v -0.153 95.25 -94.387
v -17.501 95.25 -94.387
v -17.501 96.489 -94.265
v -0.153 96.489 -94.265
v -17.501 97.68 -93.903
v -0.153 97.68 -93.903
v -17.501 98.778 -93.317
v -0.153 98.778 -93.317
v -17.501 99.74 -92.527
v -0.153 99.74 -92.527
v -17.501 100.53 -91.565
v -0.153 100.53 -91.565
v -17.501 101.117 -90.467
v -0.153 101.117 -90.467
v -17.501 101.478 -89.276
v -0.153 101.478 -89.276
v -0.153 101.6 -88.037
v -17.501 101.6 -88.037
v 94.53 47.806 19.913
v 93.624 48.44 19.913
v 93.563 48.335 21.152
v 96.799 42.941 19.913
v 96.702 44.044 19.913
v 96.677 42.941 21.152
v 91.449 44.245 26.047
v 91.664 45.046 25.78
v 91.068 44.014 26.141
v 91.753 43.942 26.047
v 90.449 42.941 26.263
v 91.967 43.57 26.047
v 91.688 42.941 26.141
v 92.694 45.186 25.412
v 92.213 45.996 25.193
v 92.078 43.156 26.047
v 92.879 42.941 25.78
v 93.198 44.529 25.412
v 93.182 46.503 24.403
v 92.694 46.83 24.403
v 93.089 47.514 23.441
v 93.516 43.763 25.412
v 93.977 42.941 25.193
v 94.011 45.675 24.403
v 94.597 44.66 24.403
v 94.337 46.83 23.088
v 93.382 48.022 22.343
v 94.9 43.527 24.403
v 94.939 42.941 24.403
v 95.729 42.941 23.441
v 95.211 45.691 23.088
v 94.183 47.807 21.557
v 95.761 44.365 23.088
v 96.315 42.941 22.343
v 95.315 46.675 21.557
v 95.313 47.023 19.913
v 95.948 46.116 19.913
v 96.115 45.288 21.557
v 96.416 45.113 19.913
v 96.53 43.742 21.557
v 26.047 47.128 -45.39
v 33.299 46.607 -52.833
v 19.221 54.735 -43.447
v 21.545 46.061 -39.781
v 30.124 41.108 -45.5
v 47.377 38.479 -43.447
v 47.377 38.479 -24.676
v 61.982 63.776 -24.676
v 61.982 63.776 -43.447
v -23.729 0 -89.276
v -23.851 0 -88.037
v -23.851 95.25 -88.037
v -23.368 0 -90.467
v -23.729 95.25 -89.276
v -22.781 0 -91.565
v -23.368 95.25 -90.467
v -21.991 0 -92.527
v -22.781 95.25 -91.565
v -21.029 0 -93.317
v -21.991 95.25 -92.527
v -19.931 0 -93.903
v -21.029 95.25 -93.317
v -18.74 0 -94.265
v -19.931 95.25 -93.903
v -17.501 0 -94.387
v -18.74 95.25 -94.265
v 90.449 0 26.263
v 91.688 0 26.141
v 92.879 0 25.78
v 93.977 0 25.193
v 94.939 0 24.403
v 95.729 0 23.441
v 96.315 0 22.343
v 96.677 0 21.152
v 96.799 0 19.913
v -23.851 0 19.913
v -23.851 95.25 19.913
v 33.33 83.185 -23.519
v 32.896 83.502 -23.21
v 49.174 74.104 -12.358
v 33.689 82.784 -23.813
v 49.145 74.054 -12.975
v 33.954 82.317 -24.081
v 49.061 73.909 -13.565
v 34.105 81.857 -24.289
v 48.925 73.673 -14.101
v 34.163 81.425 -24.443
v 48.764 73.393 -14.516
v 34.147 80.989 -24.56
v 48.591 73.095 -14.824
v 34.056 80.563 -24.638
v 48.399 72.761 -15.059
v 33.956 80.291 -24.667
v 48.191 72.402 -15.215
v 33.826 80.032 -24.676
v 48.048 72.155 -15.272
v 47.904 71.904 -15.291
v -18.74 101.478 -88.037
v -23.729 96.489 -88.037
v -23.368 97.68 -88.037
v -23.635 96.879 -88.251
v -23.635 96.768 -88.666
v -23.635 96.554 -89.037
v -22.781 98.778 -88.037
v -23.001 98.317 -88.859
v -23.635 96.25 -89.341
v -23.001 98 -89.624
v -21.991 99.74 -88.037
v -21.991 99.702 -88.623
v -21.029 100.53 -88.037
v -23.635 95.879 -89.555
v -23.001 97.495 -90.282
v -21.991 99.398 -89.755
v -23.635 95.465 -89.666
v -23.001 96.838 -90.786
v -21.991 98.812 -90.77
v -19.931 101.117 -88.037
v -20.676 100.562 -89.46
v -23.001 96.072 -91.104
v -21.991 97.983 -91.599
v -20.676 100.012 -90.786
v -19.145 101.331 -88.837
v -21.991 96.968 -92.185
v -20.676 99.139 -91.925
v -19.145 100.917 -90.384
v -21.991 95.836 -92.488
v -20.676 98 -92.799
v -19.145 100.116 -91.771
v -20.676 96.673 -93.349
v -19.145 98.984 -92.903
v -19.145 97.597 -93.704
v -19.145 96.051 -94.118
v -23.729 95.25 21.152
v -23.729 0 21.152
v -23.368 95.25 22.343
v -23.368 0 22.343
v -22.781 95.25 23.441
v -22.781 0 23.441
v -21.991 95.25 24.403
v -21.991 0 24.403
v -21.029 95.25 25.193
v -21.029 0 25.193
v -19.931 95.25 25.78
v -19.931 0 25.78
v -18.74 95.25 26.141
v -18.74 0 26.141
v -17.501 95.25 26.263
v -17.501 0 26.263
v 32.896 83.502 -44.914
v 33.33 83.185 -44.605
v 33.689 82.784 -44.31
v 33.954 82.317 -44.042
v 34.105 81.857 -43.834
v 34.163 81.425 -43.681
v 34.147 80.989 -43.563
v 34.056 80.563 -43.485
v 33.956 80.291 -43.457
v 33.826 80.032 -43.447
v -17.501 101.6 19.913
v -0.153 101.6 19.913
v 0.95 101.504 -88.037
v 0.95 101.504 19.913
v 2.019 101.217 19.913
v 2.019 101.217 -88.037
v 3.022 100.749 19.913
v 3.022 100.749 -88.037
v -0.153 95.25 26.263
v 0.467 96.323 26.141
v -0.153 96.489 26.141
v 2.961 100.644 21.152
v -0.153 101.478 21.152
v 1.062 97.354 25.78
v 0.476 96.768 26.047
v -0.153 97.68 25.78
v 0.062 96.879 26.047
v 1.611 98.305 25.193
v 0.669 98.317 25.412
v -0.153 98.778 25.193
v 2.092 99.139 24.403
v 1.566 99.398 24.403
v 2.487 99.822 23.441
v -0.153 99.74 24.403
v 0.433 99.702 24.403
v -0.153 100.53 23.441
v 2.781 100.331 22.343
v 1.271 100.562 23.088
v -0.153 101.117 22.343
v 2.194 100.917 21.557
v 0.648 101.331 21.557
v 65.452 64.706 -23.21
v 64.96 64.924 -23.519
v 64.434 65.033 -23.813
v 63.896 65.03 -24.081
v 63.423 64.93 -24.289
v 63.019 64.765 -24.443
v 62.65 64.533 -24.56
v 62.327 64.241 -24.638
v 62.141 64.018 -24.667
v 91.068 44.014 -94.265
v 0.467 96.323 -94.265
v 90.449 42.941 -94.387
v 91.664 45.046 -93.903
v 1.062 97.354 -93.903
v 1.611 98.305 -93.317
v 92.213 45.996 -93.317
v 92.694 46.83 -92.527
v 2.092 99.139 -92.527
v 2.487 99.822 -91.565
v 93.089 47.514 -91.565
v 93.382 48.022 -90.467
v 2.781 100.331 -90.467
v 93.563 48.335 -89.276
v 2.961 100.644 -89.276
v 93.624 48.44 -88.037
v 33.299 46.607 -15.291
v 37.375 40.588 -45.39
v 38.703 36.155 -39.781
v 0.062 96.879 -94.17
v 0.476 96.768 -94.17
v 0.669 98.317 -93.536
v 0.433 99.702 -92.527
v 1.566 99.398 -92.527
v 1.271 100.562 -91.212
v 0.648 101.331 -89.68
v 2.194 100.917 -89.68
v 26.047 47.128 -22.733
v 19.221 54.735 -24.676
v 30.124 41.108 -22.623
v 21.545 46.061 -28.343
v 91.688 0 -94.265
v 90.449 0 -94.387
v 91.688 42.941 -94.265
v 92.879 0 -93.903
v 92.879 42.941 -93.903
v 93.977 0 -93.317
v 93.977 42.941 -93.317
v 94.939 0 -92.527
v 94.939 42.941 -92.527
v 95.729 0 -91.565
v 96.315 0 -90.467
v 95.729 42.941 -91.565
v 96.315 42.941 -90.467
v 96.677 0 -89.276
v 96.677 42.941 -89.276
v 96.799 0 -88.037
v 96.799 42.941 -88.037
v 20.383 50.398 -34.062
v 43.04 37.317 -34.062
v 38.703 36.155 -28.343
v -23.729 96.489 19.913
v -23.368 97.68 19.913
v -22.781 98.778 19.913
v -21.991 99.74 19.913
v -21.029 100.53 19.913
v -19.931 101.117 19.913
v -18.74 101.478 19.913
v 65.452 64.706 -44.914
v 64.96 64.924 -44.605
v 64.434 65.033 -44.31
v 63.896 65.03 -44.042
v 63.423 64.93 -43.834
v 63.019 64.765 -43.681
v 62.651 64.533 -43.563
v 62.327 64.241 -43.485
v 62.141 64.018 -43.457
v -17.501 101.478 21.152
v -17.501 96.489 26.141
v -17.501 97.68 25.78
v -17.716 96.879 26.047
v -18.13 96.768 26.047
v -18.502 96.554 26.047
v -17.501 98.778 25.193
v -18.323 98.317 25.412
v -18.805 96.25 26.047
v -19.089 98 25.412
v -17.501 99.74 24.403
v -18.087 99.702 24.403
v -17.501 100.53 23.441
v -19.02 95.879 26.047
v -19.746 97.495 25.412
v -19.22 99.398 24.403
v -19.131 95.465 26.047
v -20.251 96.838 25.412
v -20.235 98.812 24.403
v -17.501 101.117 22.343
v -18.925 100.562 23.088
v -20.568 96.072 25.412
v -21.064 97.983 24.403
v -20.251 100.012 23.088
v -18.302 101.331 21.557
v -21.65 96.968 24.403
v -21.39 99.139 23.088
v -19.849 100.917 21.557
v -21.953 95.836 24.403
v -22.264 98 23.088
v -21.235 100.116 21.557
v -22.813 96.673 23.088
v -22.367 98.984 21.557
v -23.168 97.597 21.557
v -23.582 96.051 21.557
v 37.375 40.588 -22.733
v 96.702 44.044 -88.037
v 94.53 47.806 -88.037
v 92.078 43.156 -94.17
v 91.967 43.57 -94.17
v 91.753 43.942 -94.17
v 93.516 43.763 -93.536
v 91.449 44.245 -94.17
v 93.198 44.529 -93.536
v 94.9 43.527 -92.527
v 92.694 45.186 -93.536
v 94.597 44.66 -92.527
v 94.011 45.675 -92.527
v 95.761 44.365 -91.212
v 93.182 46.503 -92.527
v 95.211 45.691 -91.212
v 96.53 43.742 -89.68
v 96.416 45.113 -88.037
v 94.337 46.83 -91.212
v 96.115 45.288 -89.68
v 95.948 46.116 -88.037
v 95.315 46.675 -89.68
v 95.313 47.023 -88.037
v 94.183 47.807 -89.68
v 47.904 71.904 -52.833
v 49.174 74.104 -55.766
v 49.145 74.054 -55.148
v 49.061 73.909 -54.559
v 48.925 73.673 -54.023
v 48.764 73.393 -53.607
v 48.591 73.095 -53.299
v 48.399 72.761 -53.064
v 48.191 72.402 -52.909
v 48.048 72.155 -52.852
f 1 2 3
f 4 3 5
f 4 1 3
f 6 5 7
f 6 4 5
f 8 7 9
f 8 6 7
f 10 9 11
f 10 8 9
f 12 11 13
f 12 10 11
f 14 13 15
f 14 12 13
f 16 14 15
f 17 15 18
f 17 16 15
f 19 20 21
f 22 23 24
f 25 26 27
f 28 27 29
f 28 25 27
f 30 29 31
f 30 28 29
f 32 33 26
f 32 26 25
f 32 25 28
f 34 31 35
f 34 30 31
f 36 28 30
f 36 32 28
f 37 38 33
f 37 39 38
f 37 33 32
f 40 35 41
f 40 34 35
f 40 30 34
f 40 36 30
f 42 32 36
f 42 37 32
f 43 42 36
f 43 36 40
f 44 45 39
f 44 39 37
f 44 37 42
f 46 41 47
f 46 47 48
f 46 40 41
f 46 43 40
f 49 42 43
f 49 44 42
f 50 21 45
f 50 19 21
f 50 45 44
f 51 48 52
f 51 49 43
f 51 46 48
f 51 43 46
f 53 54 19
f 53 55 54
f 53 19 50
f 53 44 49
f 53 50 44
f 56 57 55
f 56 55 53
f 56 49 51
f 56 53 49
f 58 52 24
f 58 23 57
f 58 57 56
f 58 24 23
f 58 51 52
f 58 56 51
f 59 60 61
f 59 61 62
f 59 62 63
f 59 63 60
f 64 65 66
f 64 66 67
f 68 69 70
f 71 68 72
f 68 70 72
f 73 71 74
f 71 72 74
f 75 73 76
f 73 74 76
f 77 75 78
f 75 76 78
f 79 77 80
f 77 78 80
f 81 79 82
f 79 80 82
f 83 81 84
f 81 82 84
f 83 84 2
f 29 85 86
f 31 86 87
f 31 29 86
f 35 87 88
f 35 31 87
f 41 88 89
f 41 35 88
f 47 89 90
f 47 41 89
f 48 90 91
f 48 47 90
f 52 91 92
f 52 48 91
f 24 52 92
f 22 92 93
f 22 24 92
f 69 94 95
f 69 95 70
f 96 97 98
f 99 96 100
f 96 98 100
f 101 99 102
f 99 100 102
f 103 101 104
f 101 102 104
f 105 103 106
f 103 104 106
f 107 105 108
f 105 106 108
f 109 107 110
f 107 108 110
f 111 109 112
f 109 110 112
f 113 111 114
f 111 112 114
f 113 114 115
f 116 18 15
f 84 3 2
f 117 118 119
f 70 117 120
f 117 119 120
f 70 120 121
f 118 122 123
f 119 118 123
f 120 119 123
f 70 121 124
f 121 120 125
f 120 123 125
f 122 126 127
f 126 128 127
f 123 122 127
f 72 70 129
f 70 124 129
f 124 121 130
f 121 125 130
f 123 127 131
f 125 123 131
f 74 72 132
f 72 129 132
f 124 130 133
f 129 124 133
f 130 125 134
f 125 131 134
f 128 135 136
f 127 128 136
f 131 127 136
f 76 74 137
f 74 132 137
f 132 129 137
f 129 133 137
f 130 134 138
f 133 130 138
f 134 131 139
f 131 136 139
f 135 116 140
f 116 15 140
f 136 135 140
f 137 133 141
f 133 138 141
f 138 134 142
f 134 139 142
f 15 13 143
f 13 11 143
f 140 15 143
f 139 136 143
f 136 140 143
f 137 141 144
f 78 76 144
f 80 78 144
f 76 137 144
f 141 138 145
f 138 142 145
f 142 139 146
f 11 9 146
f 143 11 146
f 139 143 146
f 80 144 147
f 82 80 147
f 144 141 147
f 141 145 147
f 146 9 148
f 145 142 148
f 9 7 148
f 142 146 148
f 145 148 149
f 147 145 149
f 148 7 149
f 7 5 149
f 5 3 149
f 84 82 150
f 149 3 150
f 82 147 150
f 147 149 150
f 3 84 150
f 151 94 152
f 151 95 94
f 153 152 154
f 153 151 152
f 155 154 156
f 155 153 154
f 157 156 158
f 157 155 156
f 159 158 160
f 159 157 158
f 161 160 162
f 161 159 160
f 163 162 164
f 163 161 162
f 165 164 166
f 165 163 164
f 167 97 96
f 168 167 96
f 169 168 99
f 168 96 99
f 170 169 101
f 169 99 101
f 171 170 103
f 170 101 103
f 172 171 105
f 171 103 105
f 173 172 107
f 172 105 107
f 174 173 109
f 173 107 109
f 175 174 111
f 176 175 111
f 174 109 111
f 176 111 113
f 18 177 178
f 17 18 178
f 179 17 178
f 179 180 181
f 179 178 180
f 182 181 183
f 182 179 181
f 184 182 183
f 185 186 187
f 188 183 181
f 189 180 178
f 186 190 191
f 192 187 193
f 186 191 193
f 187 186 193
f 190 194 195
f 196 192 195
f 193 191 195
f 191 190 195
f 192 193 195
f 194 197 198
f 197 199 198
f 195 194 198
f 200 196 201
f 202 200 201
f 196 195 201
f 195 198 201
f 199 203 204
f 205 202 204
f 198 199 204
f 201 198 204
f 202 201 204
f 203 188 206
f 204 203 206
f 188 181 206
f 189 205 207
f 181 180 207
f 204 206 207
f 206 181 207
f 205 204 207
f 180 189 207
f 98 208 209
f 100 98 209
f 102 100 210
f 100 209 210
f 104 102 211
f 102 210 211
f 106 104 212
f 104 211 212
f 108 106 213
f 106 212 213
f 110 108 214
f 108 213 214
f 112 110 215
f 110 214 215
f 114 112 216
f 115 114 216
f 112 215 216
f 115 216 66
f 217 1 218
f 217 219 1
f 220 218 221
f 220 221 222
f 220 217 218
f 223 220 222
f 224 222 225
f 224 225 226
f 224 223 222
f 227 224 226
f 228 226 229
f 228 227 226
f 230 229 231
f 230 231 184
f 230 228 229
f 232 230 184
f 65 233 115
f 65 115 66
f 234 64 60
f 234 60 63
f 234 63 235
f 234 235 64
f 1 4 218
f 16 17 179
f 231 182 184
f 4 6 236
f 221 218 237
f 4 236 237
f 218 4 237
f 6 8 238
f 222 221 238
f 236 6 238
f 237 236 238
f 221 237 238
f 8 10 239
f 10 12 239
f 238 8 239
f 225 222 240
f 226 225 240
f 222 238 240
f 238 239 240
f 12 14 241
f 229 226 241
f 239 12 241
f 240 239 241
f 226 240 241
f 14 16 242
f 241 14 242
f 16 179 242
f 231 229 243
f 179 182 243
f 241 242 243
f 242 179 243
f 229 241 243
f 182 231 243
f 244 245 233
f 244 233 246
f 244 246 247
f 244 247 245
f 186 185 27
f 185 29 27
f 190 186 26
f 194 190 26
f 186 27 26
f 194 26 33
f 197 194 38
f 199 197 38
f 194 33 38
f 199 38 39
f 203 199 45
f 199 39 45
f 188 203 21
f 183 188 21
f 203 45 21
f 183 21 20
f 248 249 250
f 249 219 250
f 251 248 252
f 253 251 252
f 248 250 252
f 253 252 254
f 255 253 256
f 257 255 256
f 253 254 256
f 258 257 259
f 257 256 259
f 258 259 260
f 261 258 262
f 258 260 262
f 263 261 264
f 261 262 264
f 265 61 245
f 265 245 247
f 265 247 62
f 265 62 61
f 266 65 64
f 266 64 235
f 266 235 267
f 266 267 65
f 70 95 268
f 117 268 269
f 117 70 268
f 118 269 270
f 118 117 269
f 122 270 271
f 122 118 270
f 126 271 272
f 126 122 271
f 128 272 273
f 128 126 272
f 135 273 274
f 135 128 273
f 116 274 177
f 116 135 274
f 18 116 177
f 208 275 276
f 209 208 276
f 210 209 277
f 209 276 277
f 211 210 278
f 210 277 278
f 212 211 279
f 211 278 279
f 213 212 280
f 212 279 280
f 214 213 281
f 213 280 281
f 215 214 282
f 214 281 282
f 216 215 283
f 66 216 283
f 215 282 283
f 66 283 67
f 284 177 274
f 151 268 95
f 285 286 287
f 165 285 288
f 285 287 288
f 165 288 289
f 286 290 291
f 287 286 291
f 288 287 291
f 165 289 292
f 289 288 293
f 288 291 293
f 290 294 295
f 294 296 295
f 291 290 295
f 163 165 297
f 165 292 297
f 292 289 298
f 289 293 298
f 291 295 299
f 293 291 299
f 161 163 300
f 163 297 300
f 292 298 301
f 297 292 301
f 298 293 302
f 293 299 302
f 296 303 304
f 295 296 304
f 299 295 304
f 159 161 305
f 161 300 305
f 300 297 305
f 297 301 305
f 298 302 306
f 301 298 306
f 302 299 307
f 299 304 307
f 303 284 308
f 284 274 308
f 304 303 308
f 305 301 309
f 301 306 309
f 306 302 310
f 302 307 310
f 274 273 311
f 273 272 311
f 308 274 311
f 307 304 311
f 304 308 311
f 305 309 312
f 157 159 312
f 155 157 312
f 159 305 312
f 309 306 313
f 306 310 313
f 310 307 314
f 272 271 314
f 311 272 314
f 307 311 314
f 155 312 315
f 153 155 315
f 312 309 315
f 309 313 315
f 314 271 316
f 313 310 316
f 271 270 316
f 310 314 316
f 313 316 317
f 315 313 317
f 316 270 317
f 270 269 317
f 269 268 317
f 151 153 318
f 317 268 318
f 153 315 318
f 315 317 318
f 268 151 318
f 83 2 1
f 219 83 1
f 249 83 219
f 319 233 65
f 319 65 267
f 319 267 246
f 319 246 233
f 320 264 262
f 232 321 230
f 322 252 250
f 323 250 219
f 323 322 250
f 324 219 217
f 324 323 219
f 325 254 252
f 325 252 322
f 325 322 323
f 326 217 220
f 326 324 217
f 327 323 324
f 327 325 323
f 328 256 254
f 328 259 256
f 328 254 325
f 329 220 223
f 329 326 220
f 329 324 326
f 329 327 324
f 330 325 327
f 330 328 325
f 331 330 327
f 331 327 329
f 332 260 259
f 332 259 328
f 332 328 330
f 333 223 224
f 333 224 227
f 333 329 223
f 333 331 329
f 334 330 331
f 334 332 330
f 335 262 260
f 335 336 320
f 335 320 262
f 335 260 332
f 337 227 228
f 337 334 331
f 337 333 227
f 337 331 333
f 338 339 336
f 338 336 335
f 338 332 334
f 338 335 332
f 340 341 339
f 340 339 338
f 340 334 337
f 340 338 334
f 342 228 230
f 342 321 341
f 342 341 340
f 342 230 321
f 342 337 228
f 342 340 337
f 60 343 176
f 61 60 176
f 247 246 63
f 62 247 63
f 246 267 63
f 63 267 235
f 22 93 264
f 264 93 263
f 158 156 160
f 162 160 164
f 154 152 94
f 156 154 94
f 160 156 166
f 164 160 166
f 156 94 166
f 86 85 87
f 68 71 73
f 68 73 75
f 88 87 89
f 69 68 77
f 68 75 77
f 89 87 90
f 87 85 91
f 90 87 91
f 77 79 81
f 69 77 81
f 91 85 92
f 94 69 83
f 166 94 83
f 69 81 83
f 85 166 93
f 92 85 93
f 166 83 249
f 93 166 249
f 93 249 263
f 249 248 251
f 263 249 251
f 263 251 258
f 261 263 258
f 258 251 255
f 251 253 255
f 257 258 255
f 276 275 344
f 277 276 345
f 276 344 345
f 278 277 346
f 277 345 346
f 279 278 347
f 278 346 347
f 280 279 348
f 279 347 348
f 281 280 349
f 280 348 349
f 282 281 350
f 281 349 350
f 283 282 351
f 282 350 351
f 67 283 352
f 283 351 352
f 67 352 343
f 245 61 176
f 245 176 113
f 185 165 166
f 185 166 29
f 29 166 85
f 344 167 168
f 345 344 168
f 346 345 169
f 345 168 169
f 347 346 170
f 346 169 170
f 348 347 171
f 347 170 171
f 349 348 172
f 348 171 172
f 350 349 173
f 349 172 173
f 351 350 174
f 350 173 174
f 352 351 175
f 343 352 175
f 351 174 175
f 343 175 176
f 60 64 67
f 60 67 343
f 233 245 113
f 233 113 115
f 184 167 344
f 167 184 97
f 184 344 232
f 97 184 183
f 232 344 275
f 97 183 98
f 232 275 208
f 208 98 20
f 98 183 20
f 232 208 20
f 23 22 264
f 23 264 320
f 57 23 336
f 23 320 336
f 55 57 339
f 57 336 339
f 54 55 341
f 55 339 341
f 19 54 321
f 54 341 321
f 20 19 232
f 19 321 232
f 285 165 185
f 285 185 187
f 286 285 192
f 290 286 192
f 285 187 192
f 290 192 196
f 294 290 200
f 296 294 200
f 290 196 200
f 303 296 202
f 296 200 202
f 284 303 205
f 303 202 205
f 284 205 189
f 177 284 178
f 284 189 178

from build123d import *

# Parameters (mm, degrees)
SKETCH1_W           = 120.65
SKETCH1_H           = 120.65
BOSS_EXTRUDE1_DEPTH = 101.6
CUT_EXTRUDE1_DEPTH  = 120.65
CUT_EXTRUDE2_DEPTH  = 31.75
CUT_EXTRUDE3_DEPTH  = 6.35
CUT_EXTRUDE3_TAPER  = 45
FILLET1_R           = 6.35
FILLET2_R           = 2.54


with BuildPart() as part:
    # Sketch1 → Boss-Extrude1 (new body)
    with BuildSketch(Plane(origin=(0, 0, 0), x_dir=(1, 0, 0), z_dir=(0, 1, 0))):
        with Locations((36.473705191, 34.061776503)):
            Rectangle(SKETCH1_W, SKETCH1_H)
    extrude(amount=BOSS_EXTRUDE1_DEPTH)

    # Sketch3 → Cut-Extrude1 (cut)
    with BuildSketch(Plane.XY.offset(26.263223497)):
        Polygon((96.798705191, 101.6), (1.548705191, 101.6), (96.798705191, 46.60738686), align=None)
    extrude(amount=-CUT_EXTRUDE1_DEPTH, mode=Mode.SUBTRACT)

    # Sketch4 → Cut-Extrude2 (cut)
    with BuildSketch(Plane(origin=(44.38126681, 76.870609019, 0), x_dir=(0.866025404, -0.5, 0), z_dir=(0.5, 0.866025404, 0))):
        Polygon((5.533831179, 52.832588454), (-10.722168821, 43.447182479), (-10.722168821, 24.676370527), (5.533831179, 15.290964551), (21.789831179, 24.676370527), (21.789831179, 43.447182479), align=None)
    extrude(amount=-CUT_EXTRUDE2_DEPTH, mode=Mode.SUBTRACT)

    # Sketch5 → Cut-Extrude3 (cut)
    with BuildSketch(Plane(origin=(28.50626681, 49.374302449, 0), x_dir=(0.866025404, -0.5, 0), z_dir=(0.5, 0.866025404, 0))):
        Polygon((5.533831179, 15.290964551), (21.789831179, 24.676370527), (21.789831179, 43.447182479), (5.533831179, 52.832588454), (-10.722168821, 43.447182479), (-10.722168821, 24.676370527), align=None)
    extrude(amount=-CUT_EXTRUDE3_DEPTH, taper=CUT_EXTRUDE3_TAPER, mode=Mode.SUBTRACT)

    # Fillet1
    fillet1_edges = [part.edges().sort_by_distance(p)[0] for p in [
        (-11.151294809, 101.6, -94.386776503),
        (96.798705191, 23.30369343, -94.386776503),
        (96.798705191, 23.30369343, 26.263223497),
        (49.173705191, 74.10369343, -94.386776503),
        (96.798705191, 46.60738686, -34.061776503),
        (1.548705191, 101.6, -34.061776503),
        (49.173705191, 74.10369343, 26.263223497),
        (-23.851294809, 101.6, -34.061776503),
        (-11.151294809, 101.6, 26.263223497),
        (-23.851294809, 50.8, -94.386776503),
        (-23.851294809, 50.8, 26.263223497),
    ]]
    fillet(fillet1_edges, radius=FILLET1_R)

    # Fillet2
    fillet2_edges = [part.edges().sort_by_distance(p)[0] for p in [
        (56.212759673, 70.03969343, -48.139885467),
        (42.134650709, 78.16769343, -48.139885467),
        (35.095596227, 82.23169343, -34.061776503),
        (42.134650709, 78.16769343, -19.983667539),
        (56.212759673, 70.03969343, -19.983667539),
        (63.251814155, 65.97569343, -34.061776503),
    ]]
    fillet(fillet2_edges, radius=FILLET2_R)


solid = part.part
